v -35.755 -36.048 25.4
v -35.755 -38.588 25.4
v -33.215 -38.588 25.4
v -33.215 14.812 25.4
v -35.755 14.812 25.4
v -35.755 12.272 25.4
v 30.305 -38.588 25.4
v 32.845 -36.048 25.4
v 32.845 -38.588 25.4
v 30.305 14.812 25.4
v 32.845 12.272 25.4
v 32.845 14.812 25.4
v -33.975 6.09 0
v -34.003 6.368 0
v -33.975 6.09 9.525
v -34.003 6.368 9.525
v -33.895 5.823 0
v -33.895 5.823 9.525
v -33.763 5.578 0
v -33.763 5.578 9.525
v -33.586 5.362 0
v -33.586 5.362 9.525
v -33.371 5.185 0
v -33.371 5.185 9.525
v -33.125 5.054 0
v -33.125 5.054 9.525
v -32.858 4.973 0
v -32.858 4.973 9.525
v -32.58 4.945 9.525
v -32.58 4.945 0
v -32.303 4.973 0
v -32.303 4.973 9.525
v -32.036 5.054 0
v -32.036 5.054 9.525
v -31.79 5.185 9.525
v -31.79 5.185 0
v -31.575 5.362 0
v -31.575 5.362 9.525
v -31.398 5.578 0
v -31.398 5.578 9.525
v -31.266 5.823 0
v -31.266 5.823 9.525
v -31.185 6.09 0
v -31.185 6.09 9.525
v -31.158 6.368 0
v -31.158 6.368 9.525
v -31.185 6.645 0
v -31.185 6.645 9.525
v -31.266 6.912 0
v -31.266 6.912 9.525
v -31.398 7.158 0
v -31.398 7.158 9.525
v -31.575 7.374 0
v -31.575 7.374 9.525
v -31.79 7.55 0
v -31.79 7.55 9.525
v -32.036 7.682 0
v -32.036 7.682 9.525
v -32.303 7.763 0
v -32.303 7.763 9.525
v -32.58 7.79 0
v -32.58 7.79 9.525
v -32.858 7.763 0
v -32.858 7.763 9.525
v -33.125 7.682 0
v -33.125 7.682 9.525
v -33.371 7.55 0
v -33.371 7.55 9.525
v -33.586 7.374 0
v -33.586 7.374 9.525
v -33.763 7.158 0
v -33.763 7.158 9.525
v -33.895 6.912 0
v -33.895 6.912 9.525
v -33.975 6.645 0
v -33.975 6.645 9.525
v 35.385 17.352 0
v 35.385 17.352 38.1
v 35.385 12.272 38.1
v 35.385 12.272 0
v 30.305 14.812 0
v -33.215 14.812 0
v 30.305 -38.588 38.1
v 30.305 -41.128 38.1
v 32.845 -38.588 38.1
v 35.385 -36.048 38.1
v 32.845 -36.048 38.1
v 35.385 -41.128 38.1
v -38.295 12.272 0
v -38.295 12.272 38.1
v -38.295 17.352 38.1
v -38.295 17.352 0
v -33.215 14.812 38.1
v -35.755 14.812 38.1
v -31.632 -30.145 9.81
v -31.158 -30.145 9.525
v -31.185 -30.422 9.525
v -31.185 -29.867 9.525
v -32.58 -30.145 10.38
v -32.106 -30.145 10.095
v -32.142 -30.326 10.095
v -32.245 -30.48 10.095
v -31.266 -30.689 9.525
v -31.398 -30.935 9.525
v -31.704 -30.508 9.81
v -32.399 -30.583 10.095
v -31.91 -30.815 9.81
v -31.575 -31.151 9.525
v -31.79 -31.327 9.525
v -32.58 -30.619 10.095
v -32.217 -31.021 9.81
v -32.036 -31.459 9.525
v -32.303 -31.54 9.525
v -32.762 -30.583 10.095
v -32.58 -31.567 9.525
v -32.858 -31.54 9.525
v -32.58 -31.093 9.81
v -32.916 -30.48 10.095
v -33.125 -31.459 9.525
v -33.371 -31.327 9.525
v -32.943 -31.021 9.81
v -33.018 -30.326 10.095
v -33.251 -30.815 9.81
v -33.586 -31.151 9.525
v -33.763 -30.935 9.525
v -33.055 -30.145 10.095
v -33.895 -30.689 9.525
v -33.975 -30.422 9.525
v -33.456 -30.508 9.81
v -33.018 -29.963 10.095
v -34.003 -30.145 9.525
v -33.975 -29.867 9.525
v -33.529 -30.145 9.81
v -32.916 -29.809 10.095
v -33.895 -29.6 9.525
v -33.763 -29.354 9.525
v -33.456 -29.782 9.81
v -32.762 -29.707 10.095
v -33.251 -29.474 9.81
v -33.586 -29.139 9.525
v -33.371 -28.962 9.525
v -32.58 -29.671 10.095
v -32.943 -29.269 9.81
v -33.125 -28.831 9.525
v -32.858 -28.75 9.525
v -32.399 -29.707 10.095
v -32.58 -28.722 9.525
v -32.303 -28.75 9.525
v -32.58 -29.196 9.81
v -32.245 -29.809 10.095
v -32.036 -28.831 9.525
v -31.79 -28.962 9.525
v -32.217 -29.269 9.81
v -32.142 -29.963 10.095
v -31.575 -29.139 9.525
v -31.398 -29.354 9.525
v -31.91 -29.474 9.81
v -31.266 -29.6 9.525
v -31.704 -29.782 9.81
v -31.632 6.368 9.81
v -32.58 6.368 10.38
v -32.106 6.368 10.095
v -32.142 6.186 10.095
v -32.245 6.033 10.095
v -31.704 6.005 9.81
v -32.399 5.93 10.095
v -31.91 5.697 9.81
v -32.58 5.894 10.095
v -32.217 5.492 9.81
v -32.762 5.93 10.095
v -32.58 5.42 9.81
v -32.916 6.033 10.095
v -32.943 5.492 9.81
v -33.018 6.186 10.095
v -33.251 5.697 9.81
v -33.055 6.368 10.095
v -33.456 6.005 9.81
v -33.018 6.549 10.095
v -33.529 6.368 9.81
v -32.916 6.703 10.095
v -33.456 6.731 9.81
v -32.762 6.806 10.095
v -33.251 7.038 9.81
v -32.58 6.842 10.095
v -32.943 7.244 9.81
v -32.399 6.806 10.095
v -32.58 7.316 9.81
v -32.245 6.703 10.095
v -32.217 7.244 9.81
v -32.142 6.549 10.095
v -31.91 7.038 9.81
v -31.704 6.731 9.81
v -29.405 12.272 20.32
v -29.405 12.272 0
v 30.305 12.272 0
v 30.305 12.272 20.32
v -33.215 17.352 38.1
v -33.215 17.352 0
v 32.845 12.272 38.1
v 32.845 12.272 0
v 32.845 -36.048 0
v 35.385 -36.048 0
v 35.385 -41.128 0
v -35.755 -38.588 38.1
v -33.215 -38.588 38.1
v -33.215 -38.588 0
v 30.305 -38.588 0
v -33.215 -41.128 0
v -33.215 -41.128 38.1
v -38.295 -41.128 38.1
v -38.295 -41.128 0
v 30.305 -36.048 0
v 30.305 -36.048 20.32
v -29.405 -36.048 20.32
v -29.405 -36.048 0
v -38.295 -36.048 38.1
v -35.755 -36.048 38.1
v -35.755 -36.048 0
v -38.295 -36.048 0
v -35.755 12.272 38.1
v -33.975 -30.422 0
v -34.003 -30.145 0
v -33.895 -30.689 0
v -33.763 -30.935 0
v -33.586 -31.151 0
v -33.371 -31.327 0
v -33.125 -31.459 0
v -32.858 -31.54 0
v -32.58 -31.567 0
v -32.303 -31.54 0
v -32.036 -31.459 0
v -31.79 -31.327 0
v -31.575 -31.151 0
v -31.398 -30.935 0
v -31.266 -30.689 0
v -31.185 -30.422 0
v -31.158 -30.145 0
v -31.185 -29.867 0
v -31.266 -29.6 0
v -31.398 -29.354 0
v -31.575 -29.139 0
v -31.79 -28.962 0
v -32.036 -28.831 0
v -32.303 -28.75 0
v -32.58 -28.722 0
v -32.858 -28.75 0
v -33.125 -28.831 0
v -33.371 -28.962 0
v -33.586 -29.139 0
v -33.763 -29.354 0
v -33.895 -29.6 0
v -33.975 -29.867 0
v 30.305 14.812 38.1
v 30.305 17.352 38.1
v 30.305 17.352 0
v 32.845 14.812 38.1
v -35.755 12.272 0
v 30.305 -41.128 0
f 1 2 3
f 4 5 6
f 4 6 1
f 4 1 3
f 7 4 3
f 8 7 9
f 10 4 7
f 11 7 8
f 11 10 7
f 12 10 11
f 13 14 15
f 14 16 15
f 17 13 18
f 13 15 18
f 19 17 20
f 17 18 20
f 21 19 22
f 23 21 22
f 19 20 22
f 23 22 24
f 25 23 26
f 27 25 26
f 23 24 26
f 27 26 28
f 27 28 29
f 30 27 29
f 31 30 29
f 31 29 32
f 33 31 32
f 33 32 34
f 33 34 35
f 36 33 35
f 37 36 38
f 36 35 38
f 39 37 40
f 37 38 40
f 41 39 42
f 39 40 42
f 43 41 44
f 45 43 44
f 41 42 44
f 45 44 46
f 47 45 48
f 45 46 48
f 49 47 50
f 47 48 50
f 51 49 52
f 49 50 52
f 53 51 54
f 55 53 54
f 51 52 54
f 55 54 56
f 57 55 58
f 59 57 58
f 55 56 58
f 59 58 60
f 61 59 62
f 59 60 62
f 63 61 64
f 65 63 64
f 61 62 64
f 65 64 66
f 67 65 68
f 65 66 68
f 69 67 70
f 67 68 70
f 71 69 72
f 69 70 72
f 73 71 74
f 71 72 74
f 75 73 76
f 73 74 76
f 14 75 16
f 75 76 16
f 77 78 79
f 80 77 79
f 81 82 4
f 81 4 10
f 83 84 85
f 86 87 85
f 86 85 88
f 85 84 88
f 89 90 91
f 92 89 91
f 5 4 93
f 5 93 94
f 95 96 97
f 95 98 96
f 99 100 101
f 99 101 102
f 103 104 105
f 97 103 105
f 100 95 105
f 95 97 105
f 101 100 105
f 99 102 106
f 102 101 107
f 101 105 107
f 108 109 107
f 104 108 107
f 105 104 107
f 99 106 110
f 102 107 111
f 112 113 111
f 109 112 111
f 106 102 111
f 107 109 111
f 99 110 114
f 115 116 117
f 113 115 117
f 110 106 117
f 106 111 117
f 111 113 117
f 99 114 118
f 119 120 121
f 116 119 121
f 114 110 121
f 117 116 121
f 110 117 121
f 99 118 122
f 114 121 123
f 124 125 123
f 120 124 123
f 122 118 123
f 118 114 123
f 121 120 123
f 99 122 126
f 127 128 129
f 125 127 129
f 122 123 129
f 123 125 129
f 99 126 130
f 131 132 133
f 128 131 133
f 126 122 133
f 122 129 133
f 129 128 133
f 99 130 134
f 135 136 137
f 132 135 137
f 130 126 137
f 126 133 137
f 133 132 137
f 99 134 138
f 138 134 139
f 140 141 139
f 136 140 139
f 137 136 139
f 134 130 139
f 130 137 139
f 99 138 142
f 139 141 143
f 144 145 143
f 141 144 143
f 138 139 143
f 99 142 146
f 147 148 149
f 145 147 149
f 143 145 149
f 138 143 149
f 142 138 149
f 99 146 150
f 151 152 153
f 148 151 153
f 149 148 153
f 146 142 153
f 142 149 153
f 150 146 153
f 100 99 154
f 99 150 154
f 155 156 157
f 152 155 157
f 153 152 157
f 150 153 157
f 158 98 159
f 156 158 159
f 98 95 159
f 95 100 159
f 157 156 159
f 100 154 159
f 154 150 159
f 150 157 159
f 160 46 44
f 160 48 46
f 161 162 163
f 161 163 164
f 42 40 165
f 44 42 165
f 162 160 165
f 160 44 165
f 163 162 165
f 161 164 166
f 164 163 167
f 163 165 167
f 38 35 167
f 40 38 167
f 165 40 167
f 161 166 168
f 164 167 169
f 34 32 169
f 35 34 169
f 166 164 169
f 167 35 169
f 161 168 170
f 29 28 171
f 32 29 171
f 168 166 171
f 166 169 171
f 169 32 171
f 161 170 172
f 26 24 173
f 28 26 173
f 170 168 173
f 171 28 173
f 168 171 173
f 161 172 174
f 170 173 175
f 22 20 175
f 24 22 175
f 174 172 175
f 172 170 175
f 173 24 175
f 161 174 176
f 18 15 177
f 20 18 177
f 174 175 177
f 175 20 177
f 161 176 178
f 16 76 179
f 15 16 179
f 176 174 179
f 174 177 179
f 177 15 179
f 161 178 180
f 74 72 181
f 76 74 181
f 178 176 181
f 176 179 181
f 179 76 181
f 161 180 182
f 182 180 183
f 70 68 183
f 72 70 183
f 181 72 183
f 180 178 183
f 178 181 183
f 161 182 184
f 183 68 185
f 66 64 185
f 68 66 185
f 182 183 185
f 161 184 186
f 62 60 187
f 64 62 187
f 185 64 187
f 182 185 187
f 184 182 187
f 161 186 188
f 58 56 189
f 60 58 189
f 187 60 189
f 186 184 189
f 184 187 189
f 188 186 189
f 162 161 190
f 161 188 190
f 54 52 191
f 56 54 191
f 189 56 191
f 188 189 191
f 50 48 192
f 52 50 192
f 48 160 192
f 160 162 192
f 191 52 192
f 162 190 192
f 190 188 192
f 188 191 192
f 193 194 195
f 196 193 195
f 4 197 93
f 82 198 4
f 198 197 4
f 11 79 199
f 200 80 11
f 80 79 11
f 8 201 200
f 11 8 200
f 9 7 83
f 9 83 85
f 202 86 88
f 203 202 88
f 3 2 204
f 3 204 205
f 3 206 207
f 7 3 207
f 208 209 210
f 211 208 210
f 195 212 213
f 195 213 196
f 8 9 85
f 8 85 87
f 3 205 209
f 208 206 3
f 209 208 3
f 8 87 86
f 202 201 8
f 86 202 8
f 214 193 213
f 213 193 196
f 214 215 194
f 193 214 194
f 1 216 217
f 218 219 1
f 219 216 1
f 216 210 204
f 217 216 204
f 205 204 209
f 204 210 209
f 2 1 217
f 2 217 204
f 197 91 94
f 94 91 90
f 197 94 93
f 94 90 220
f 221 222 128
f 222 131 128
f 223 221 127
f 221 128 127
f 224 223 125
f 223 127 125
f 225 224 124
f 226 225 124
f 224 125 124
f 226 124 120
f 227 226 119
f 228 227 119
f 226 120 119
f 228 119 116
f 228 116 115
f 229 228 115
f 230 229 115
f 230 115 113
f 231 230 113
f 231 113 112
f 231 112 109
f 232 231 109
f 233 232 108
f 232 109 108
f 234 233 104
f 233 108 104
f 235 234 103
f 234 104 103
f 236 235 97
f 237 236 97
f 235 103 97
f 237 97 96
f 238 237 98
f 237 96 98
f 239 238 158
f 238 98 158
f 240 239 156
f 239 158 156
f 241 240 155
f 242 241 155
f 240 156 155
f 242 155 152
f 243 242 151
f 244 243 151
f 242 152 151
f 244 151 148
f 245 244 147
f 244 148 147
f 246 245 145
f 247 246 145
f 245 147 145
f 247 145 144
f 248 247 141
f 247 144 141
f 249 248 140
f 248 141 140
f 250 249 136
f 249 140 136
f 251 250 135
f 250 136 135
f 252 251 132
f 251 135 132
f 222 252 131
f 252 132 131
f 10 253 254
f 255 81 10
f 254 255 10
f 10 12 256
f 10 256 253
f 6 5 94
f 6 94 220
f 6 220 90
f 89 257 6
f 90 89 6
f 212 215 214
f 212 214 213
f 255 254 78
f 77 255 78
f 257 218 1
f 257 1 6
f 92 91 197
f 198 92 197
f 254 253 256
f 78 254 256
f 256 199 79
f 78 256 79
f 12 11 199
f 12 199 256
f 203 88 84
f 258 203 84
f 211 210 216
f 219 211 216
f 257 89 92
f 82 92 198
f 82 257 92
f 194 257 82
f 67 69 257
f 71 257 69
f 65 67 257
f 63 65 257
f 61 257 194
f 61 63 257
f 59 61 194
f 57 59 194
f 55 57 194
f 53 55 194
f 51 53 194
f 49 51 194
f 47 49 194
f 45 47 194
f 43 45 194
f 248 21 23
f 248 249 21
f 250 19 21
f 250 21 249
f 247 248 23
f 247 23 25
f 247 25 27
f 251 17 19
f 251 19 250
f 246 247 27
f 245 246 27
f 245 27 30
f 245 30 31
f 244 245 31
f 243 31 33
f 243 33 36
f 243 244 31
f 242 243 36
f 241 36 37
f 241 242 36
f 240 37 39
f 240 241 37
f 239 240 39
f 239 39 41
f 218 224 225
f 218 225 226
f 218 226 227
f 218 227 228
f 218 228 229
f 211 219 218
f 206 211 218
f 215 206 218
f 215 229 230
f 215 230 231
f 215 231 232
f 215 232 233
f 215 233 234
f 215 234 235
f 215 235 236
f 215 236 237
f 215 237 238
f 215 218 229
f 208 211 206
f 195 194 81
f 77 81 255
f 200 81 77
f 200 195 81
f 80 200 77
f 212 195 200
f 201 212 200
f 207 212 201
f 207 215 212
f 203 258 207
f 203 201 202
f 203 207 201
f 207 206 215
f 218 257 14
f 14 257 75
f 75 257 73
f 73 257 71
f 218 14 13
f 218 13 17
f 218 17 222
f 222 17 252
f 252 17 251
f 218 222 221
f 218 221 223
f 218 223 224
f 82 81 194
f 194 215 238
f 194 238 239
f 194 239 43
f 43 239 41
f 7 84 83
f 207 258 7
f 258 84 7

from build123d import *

# Parameters (mm, degrees)
F0_W     = 68.6
F0_H     = 53.4
F1_DEPTH = 25.4
F3_DEPTH = 38.1
F4_DEPTH = 38.1
F7_W     = 59.71
F7_H     = 48.32
F8_DEPTH = 20.32
F9_D     = 2.8448
F9_DEPTH = 9.525
F9_TIP   = 0.8546641445


with BuildPart() as f1:
    # F0 (on Top) → F1 (new body)
    with BuildSketch(Plane.XY):
        with Locations((-1.4553847134, -11.8884605348)):
            Rectangle(F0_W, F0_H)
    extrude(amount=F1_DEPTH)

    # F2 (on face) → F3 (join)
    with BuildSketch(Plane(origin=(0, 0, 0), x_dir=(1, 0, 0), z_dir=(0, 0, -1))):
        Polygon((-35.7553847134, 38.5884605348), (-33.2153847134, 38.5884605348), (-33.2153847134, 41.1284605348), (-38.2953847134, 41.1284605348), (-38.2953847134, 36.0484605348), (-35.7553847134, 36.0484605348), align=None)
    extrude(amount=-F3_DEPTH)

    # F2 (on face) → F4 (join)
    with BuildSketch(Plane(origin=(0, 0, 0), x_dir=(1, 0, 0), z_dir=(0, 0, -1))):
        Polygon((30.3046152866, 41.1284605348), (30.3046152866, 38.5884605348), (32.8446152866, 38.5884605348), (32.8446152866, 36.0484605348), (35.3846152866, 36.0484605348), (35.3846152866, 41.1284605348), align=None)
        Polygon((-35.7553847134, -14.8115394652), (-35.7553847134, -12.2715394652), (-38.2953847134, -12.2715394652), (-38.2953847134, -17.3515394652), (-33.2153847134, -17.3515394652), (-33.2153847134, -14.8115394652), align=None)
        Polygon((35.3846152866, -12.2715394652), (32.8446152866, -12.2715394652), (32.8446152866, -14.8115394652), (30.3046152866, -14.8115394652), (30.3046152866, -17.3515394652), (35.3846152866, -17.3515394652), align=None)
    extrude(amount=-F4_DEPTH)

    # F7 (on Top) → F8 (cut)
    with BuildSketch(Plane.XY):
        with Locations((0.4496152866, -11.8884605348)):
            Rectangle(F7_W, F7_H)
    extrude(amount=F8_DEPTH, mode=Mode.SUBTRACT)

    # F9
    with Locations(Plane(origin=(0, 0, 0), x_dir=(1, 0, 0), z_dir=(0, 0, -1))):
        with Locations((-32.5803847134, 30.1447131348), (-32.5803847134, -6.3677868652)):
            Hole(F9_D / 2, depth=F9_DEPTH)
            with Locations((0, 0, -(F9_DEPTH + F9_TIP / 2))):  # 118° drill point
                Cone(0, F9_D / 2, F9_TIP, mode=Mode.SUBTRACT)


solid = f1.part
